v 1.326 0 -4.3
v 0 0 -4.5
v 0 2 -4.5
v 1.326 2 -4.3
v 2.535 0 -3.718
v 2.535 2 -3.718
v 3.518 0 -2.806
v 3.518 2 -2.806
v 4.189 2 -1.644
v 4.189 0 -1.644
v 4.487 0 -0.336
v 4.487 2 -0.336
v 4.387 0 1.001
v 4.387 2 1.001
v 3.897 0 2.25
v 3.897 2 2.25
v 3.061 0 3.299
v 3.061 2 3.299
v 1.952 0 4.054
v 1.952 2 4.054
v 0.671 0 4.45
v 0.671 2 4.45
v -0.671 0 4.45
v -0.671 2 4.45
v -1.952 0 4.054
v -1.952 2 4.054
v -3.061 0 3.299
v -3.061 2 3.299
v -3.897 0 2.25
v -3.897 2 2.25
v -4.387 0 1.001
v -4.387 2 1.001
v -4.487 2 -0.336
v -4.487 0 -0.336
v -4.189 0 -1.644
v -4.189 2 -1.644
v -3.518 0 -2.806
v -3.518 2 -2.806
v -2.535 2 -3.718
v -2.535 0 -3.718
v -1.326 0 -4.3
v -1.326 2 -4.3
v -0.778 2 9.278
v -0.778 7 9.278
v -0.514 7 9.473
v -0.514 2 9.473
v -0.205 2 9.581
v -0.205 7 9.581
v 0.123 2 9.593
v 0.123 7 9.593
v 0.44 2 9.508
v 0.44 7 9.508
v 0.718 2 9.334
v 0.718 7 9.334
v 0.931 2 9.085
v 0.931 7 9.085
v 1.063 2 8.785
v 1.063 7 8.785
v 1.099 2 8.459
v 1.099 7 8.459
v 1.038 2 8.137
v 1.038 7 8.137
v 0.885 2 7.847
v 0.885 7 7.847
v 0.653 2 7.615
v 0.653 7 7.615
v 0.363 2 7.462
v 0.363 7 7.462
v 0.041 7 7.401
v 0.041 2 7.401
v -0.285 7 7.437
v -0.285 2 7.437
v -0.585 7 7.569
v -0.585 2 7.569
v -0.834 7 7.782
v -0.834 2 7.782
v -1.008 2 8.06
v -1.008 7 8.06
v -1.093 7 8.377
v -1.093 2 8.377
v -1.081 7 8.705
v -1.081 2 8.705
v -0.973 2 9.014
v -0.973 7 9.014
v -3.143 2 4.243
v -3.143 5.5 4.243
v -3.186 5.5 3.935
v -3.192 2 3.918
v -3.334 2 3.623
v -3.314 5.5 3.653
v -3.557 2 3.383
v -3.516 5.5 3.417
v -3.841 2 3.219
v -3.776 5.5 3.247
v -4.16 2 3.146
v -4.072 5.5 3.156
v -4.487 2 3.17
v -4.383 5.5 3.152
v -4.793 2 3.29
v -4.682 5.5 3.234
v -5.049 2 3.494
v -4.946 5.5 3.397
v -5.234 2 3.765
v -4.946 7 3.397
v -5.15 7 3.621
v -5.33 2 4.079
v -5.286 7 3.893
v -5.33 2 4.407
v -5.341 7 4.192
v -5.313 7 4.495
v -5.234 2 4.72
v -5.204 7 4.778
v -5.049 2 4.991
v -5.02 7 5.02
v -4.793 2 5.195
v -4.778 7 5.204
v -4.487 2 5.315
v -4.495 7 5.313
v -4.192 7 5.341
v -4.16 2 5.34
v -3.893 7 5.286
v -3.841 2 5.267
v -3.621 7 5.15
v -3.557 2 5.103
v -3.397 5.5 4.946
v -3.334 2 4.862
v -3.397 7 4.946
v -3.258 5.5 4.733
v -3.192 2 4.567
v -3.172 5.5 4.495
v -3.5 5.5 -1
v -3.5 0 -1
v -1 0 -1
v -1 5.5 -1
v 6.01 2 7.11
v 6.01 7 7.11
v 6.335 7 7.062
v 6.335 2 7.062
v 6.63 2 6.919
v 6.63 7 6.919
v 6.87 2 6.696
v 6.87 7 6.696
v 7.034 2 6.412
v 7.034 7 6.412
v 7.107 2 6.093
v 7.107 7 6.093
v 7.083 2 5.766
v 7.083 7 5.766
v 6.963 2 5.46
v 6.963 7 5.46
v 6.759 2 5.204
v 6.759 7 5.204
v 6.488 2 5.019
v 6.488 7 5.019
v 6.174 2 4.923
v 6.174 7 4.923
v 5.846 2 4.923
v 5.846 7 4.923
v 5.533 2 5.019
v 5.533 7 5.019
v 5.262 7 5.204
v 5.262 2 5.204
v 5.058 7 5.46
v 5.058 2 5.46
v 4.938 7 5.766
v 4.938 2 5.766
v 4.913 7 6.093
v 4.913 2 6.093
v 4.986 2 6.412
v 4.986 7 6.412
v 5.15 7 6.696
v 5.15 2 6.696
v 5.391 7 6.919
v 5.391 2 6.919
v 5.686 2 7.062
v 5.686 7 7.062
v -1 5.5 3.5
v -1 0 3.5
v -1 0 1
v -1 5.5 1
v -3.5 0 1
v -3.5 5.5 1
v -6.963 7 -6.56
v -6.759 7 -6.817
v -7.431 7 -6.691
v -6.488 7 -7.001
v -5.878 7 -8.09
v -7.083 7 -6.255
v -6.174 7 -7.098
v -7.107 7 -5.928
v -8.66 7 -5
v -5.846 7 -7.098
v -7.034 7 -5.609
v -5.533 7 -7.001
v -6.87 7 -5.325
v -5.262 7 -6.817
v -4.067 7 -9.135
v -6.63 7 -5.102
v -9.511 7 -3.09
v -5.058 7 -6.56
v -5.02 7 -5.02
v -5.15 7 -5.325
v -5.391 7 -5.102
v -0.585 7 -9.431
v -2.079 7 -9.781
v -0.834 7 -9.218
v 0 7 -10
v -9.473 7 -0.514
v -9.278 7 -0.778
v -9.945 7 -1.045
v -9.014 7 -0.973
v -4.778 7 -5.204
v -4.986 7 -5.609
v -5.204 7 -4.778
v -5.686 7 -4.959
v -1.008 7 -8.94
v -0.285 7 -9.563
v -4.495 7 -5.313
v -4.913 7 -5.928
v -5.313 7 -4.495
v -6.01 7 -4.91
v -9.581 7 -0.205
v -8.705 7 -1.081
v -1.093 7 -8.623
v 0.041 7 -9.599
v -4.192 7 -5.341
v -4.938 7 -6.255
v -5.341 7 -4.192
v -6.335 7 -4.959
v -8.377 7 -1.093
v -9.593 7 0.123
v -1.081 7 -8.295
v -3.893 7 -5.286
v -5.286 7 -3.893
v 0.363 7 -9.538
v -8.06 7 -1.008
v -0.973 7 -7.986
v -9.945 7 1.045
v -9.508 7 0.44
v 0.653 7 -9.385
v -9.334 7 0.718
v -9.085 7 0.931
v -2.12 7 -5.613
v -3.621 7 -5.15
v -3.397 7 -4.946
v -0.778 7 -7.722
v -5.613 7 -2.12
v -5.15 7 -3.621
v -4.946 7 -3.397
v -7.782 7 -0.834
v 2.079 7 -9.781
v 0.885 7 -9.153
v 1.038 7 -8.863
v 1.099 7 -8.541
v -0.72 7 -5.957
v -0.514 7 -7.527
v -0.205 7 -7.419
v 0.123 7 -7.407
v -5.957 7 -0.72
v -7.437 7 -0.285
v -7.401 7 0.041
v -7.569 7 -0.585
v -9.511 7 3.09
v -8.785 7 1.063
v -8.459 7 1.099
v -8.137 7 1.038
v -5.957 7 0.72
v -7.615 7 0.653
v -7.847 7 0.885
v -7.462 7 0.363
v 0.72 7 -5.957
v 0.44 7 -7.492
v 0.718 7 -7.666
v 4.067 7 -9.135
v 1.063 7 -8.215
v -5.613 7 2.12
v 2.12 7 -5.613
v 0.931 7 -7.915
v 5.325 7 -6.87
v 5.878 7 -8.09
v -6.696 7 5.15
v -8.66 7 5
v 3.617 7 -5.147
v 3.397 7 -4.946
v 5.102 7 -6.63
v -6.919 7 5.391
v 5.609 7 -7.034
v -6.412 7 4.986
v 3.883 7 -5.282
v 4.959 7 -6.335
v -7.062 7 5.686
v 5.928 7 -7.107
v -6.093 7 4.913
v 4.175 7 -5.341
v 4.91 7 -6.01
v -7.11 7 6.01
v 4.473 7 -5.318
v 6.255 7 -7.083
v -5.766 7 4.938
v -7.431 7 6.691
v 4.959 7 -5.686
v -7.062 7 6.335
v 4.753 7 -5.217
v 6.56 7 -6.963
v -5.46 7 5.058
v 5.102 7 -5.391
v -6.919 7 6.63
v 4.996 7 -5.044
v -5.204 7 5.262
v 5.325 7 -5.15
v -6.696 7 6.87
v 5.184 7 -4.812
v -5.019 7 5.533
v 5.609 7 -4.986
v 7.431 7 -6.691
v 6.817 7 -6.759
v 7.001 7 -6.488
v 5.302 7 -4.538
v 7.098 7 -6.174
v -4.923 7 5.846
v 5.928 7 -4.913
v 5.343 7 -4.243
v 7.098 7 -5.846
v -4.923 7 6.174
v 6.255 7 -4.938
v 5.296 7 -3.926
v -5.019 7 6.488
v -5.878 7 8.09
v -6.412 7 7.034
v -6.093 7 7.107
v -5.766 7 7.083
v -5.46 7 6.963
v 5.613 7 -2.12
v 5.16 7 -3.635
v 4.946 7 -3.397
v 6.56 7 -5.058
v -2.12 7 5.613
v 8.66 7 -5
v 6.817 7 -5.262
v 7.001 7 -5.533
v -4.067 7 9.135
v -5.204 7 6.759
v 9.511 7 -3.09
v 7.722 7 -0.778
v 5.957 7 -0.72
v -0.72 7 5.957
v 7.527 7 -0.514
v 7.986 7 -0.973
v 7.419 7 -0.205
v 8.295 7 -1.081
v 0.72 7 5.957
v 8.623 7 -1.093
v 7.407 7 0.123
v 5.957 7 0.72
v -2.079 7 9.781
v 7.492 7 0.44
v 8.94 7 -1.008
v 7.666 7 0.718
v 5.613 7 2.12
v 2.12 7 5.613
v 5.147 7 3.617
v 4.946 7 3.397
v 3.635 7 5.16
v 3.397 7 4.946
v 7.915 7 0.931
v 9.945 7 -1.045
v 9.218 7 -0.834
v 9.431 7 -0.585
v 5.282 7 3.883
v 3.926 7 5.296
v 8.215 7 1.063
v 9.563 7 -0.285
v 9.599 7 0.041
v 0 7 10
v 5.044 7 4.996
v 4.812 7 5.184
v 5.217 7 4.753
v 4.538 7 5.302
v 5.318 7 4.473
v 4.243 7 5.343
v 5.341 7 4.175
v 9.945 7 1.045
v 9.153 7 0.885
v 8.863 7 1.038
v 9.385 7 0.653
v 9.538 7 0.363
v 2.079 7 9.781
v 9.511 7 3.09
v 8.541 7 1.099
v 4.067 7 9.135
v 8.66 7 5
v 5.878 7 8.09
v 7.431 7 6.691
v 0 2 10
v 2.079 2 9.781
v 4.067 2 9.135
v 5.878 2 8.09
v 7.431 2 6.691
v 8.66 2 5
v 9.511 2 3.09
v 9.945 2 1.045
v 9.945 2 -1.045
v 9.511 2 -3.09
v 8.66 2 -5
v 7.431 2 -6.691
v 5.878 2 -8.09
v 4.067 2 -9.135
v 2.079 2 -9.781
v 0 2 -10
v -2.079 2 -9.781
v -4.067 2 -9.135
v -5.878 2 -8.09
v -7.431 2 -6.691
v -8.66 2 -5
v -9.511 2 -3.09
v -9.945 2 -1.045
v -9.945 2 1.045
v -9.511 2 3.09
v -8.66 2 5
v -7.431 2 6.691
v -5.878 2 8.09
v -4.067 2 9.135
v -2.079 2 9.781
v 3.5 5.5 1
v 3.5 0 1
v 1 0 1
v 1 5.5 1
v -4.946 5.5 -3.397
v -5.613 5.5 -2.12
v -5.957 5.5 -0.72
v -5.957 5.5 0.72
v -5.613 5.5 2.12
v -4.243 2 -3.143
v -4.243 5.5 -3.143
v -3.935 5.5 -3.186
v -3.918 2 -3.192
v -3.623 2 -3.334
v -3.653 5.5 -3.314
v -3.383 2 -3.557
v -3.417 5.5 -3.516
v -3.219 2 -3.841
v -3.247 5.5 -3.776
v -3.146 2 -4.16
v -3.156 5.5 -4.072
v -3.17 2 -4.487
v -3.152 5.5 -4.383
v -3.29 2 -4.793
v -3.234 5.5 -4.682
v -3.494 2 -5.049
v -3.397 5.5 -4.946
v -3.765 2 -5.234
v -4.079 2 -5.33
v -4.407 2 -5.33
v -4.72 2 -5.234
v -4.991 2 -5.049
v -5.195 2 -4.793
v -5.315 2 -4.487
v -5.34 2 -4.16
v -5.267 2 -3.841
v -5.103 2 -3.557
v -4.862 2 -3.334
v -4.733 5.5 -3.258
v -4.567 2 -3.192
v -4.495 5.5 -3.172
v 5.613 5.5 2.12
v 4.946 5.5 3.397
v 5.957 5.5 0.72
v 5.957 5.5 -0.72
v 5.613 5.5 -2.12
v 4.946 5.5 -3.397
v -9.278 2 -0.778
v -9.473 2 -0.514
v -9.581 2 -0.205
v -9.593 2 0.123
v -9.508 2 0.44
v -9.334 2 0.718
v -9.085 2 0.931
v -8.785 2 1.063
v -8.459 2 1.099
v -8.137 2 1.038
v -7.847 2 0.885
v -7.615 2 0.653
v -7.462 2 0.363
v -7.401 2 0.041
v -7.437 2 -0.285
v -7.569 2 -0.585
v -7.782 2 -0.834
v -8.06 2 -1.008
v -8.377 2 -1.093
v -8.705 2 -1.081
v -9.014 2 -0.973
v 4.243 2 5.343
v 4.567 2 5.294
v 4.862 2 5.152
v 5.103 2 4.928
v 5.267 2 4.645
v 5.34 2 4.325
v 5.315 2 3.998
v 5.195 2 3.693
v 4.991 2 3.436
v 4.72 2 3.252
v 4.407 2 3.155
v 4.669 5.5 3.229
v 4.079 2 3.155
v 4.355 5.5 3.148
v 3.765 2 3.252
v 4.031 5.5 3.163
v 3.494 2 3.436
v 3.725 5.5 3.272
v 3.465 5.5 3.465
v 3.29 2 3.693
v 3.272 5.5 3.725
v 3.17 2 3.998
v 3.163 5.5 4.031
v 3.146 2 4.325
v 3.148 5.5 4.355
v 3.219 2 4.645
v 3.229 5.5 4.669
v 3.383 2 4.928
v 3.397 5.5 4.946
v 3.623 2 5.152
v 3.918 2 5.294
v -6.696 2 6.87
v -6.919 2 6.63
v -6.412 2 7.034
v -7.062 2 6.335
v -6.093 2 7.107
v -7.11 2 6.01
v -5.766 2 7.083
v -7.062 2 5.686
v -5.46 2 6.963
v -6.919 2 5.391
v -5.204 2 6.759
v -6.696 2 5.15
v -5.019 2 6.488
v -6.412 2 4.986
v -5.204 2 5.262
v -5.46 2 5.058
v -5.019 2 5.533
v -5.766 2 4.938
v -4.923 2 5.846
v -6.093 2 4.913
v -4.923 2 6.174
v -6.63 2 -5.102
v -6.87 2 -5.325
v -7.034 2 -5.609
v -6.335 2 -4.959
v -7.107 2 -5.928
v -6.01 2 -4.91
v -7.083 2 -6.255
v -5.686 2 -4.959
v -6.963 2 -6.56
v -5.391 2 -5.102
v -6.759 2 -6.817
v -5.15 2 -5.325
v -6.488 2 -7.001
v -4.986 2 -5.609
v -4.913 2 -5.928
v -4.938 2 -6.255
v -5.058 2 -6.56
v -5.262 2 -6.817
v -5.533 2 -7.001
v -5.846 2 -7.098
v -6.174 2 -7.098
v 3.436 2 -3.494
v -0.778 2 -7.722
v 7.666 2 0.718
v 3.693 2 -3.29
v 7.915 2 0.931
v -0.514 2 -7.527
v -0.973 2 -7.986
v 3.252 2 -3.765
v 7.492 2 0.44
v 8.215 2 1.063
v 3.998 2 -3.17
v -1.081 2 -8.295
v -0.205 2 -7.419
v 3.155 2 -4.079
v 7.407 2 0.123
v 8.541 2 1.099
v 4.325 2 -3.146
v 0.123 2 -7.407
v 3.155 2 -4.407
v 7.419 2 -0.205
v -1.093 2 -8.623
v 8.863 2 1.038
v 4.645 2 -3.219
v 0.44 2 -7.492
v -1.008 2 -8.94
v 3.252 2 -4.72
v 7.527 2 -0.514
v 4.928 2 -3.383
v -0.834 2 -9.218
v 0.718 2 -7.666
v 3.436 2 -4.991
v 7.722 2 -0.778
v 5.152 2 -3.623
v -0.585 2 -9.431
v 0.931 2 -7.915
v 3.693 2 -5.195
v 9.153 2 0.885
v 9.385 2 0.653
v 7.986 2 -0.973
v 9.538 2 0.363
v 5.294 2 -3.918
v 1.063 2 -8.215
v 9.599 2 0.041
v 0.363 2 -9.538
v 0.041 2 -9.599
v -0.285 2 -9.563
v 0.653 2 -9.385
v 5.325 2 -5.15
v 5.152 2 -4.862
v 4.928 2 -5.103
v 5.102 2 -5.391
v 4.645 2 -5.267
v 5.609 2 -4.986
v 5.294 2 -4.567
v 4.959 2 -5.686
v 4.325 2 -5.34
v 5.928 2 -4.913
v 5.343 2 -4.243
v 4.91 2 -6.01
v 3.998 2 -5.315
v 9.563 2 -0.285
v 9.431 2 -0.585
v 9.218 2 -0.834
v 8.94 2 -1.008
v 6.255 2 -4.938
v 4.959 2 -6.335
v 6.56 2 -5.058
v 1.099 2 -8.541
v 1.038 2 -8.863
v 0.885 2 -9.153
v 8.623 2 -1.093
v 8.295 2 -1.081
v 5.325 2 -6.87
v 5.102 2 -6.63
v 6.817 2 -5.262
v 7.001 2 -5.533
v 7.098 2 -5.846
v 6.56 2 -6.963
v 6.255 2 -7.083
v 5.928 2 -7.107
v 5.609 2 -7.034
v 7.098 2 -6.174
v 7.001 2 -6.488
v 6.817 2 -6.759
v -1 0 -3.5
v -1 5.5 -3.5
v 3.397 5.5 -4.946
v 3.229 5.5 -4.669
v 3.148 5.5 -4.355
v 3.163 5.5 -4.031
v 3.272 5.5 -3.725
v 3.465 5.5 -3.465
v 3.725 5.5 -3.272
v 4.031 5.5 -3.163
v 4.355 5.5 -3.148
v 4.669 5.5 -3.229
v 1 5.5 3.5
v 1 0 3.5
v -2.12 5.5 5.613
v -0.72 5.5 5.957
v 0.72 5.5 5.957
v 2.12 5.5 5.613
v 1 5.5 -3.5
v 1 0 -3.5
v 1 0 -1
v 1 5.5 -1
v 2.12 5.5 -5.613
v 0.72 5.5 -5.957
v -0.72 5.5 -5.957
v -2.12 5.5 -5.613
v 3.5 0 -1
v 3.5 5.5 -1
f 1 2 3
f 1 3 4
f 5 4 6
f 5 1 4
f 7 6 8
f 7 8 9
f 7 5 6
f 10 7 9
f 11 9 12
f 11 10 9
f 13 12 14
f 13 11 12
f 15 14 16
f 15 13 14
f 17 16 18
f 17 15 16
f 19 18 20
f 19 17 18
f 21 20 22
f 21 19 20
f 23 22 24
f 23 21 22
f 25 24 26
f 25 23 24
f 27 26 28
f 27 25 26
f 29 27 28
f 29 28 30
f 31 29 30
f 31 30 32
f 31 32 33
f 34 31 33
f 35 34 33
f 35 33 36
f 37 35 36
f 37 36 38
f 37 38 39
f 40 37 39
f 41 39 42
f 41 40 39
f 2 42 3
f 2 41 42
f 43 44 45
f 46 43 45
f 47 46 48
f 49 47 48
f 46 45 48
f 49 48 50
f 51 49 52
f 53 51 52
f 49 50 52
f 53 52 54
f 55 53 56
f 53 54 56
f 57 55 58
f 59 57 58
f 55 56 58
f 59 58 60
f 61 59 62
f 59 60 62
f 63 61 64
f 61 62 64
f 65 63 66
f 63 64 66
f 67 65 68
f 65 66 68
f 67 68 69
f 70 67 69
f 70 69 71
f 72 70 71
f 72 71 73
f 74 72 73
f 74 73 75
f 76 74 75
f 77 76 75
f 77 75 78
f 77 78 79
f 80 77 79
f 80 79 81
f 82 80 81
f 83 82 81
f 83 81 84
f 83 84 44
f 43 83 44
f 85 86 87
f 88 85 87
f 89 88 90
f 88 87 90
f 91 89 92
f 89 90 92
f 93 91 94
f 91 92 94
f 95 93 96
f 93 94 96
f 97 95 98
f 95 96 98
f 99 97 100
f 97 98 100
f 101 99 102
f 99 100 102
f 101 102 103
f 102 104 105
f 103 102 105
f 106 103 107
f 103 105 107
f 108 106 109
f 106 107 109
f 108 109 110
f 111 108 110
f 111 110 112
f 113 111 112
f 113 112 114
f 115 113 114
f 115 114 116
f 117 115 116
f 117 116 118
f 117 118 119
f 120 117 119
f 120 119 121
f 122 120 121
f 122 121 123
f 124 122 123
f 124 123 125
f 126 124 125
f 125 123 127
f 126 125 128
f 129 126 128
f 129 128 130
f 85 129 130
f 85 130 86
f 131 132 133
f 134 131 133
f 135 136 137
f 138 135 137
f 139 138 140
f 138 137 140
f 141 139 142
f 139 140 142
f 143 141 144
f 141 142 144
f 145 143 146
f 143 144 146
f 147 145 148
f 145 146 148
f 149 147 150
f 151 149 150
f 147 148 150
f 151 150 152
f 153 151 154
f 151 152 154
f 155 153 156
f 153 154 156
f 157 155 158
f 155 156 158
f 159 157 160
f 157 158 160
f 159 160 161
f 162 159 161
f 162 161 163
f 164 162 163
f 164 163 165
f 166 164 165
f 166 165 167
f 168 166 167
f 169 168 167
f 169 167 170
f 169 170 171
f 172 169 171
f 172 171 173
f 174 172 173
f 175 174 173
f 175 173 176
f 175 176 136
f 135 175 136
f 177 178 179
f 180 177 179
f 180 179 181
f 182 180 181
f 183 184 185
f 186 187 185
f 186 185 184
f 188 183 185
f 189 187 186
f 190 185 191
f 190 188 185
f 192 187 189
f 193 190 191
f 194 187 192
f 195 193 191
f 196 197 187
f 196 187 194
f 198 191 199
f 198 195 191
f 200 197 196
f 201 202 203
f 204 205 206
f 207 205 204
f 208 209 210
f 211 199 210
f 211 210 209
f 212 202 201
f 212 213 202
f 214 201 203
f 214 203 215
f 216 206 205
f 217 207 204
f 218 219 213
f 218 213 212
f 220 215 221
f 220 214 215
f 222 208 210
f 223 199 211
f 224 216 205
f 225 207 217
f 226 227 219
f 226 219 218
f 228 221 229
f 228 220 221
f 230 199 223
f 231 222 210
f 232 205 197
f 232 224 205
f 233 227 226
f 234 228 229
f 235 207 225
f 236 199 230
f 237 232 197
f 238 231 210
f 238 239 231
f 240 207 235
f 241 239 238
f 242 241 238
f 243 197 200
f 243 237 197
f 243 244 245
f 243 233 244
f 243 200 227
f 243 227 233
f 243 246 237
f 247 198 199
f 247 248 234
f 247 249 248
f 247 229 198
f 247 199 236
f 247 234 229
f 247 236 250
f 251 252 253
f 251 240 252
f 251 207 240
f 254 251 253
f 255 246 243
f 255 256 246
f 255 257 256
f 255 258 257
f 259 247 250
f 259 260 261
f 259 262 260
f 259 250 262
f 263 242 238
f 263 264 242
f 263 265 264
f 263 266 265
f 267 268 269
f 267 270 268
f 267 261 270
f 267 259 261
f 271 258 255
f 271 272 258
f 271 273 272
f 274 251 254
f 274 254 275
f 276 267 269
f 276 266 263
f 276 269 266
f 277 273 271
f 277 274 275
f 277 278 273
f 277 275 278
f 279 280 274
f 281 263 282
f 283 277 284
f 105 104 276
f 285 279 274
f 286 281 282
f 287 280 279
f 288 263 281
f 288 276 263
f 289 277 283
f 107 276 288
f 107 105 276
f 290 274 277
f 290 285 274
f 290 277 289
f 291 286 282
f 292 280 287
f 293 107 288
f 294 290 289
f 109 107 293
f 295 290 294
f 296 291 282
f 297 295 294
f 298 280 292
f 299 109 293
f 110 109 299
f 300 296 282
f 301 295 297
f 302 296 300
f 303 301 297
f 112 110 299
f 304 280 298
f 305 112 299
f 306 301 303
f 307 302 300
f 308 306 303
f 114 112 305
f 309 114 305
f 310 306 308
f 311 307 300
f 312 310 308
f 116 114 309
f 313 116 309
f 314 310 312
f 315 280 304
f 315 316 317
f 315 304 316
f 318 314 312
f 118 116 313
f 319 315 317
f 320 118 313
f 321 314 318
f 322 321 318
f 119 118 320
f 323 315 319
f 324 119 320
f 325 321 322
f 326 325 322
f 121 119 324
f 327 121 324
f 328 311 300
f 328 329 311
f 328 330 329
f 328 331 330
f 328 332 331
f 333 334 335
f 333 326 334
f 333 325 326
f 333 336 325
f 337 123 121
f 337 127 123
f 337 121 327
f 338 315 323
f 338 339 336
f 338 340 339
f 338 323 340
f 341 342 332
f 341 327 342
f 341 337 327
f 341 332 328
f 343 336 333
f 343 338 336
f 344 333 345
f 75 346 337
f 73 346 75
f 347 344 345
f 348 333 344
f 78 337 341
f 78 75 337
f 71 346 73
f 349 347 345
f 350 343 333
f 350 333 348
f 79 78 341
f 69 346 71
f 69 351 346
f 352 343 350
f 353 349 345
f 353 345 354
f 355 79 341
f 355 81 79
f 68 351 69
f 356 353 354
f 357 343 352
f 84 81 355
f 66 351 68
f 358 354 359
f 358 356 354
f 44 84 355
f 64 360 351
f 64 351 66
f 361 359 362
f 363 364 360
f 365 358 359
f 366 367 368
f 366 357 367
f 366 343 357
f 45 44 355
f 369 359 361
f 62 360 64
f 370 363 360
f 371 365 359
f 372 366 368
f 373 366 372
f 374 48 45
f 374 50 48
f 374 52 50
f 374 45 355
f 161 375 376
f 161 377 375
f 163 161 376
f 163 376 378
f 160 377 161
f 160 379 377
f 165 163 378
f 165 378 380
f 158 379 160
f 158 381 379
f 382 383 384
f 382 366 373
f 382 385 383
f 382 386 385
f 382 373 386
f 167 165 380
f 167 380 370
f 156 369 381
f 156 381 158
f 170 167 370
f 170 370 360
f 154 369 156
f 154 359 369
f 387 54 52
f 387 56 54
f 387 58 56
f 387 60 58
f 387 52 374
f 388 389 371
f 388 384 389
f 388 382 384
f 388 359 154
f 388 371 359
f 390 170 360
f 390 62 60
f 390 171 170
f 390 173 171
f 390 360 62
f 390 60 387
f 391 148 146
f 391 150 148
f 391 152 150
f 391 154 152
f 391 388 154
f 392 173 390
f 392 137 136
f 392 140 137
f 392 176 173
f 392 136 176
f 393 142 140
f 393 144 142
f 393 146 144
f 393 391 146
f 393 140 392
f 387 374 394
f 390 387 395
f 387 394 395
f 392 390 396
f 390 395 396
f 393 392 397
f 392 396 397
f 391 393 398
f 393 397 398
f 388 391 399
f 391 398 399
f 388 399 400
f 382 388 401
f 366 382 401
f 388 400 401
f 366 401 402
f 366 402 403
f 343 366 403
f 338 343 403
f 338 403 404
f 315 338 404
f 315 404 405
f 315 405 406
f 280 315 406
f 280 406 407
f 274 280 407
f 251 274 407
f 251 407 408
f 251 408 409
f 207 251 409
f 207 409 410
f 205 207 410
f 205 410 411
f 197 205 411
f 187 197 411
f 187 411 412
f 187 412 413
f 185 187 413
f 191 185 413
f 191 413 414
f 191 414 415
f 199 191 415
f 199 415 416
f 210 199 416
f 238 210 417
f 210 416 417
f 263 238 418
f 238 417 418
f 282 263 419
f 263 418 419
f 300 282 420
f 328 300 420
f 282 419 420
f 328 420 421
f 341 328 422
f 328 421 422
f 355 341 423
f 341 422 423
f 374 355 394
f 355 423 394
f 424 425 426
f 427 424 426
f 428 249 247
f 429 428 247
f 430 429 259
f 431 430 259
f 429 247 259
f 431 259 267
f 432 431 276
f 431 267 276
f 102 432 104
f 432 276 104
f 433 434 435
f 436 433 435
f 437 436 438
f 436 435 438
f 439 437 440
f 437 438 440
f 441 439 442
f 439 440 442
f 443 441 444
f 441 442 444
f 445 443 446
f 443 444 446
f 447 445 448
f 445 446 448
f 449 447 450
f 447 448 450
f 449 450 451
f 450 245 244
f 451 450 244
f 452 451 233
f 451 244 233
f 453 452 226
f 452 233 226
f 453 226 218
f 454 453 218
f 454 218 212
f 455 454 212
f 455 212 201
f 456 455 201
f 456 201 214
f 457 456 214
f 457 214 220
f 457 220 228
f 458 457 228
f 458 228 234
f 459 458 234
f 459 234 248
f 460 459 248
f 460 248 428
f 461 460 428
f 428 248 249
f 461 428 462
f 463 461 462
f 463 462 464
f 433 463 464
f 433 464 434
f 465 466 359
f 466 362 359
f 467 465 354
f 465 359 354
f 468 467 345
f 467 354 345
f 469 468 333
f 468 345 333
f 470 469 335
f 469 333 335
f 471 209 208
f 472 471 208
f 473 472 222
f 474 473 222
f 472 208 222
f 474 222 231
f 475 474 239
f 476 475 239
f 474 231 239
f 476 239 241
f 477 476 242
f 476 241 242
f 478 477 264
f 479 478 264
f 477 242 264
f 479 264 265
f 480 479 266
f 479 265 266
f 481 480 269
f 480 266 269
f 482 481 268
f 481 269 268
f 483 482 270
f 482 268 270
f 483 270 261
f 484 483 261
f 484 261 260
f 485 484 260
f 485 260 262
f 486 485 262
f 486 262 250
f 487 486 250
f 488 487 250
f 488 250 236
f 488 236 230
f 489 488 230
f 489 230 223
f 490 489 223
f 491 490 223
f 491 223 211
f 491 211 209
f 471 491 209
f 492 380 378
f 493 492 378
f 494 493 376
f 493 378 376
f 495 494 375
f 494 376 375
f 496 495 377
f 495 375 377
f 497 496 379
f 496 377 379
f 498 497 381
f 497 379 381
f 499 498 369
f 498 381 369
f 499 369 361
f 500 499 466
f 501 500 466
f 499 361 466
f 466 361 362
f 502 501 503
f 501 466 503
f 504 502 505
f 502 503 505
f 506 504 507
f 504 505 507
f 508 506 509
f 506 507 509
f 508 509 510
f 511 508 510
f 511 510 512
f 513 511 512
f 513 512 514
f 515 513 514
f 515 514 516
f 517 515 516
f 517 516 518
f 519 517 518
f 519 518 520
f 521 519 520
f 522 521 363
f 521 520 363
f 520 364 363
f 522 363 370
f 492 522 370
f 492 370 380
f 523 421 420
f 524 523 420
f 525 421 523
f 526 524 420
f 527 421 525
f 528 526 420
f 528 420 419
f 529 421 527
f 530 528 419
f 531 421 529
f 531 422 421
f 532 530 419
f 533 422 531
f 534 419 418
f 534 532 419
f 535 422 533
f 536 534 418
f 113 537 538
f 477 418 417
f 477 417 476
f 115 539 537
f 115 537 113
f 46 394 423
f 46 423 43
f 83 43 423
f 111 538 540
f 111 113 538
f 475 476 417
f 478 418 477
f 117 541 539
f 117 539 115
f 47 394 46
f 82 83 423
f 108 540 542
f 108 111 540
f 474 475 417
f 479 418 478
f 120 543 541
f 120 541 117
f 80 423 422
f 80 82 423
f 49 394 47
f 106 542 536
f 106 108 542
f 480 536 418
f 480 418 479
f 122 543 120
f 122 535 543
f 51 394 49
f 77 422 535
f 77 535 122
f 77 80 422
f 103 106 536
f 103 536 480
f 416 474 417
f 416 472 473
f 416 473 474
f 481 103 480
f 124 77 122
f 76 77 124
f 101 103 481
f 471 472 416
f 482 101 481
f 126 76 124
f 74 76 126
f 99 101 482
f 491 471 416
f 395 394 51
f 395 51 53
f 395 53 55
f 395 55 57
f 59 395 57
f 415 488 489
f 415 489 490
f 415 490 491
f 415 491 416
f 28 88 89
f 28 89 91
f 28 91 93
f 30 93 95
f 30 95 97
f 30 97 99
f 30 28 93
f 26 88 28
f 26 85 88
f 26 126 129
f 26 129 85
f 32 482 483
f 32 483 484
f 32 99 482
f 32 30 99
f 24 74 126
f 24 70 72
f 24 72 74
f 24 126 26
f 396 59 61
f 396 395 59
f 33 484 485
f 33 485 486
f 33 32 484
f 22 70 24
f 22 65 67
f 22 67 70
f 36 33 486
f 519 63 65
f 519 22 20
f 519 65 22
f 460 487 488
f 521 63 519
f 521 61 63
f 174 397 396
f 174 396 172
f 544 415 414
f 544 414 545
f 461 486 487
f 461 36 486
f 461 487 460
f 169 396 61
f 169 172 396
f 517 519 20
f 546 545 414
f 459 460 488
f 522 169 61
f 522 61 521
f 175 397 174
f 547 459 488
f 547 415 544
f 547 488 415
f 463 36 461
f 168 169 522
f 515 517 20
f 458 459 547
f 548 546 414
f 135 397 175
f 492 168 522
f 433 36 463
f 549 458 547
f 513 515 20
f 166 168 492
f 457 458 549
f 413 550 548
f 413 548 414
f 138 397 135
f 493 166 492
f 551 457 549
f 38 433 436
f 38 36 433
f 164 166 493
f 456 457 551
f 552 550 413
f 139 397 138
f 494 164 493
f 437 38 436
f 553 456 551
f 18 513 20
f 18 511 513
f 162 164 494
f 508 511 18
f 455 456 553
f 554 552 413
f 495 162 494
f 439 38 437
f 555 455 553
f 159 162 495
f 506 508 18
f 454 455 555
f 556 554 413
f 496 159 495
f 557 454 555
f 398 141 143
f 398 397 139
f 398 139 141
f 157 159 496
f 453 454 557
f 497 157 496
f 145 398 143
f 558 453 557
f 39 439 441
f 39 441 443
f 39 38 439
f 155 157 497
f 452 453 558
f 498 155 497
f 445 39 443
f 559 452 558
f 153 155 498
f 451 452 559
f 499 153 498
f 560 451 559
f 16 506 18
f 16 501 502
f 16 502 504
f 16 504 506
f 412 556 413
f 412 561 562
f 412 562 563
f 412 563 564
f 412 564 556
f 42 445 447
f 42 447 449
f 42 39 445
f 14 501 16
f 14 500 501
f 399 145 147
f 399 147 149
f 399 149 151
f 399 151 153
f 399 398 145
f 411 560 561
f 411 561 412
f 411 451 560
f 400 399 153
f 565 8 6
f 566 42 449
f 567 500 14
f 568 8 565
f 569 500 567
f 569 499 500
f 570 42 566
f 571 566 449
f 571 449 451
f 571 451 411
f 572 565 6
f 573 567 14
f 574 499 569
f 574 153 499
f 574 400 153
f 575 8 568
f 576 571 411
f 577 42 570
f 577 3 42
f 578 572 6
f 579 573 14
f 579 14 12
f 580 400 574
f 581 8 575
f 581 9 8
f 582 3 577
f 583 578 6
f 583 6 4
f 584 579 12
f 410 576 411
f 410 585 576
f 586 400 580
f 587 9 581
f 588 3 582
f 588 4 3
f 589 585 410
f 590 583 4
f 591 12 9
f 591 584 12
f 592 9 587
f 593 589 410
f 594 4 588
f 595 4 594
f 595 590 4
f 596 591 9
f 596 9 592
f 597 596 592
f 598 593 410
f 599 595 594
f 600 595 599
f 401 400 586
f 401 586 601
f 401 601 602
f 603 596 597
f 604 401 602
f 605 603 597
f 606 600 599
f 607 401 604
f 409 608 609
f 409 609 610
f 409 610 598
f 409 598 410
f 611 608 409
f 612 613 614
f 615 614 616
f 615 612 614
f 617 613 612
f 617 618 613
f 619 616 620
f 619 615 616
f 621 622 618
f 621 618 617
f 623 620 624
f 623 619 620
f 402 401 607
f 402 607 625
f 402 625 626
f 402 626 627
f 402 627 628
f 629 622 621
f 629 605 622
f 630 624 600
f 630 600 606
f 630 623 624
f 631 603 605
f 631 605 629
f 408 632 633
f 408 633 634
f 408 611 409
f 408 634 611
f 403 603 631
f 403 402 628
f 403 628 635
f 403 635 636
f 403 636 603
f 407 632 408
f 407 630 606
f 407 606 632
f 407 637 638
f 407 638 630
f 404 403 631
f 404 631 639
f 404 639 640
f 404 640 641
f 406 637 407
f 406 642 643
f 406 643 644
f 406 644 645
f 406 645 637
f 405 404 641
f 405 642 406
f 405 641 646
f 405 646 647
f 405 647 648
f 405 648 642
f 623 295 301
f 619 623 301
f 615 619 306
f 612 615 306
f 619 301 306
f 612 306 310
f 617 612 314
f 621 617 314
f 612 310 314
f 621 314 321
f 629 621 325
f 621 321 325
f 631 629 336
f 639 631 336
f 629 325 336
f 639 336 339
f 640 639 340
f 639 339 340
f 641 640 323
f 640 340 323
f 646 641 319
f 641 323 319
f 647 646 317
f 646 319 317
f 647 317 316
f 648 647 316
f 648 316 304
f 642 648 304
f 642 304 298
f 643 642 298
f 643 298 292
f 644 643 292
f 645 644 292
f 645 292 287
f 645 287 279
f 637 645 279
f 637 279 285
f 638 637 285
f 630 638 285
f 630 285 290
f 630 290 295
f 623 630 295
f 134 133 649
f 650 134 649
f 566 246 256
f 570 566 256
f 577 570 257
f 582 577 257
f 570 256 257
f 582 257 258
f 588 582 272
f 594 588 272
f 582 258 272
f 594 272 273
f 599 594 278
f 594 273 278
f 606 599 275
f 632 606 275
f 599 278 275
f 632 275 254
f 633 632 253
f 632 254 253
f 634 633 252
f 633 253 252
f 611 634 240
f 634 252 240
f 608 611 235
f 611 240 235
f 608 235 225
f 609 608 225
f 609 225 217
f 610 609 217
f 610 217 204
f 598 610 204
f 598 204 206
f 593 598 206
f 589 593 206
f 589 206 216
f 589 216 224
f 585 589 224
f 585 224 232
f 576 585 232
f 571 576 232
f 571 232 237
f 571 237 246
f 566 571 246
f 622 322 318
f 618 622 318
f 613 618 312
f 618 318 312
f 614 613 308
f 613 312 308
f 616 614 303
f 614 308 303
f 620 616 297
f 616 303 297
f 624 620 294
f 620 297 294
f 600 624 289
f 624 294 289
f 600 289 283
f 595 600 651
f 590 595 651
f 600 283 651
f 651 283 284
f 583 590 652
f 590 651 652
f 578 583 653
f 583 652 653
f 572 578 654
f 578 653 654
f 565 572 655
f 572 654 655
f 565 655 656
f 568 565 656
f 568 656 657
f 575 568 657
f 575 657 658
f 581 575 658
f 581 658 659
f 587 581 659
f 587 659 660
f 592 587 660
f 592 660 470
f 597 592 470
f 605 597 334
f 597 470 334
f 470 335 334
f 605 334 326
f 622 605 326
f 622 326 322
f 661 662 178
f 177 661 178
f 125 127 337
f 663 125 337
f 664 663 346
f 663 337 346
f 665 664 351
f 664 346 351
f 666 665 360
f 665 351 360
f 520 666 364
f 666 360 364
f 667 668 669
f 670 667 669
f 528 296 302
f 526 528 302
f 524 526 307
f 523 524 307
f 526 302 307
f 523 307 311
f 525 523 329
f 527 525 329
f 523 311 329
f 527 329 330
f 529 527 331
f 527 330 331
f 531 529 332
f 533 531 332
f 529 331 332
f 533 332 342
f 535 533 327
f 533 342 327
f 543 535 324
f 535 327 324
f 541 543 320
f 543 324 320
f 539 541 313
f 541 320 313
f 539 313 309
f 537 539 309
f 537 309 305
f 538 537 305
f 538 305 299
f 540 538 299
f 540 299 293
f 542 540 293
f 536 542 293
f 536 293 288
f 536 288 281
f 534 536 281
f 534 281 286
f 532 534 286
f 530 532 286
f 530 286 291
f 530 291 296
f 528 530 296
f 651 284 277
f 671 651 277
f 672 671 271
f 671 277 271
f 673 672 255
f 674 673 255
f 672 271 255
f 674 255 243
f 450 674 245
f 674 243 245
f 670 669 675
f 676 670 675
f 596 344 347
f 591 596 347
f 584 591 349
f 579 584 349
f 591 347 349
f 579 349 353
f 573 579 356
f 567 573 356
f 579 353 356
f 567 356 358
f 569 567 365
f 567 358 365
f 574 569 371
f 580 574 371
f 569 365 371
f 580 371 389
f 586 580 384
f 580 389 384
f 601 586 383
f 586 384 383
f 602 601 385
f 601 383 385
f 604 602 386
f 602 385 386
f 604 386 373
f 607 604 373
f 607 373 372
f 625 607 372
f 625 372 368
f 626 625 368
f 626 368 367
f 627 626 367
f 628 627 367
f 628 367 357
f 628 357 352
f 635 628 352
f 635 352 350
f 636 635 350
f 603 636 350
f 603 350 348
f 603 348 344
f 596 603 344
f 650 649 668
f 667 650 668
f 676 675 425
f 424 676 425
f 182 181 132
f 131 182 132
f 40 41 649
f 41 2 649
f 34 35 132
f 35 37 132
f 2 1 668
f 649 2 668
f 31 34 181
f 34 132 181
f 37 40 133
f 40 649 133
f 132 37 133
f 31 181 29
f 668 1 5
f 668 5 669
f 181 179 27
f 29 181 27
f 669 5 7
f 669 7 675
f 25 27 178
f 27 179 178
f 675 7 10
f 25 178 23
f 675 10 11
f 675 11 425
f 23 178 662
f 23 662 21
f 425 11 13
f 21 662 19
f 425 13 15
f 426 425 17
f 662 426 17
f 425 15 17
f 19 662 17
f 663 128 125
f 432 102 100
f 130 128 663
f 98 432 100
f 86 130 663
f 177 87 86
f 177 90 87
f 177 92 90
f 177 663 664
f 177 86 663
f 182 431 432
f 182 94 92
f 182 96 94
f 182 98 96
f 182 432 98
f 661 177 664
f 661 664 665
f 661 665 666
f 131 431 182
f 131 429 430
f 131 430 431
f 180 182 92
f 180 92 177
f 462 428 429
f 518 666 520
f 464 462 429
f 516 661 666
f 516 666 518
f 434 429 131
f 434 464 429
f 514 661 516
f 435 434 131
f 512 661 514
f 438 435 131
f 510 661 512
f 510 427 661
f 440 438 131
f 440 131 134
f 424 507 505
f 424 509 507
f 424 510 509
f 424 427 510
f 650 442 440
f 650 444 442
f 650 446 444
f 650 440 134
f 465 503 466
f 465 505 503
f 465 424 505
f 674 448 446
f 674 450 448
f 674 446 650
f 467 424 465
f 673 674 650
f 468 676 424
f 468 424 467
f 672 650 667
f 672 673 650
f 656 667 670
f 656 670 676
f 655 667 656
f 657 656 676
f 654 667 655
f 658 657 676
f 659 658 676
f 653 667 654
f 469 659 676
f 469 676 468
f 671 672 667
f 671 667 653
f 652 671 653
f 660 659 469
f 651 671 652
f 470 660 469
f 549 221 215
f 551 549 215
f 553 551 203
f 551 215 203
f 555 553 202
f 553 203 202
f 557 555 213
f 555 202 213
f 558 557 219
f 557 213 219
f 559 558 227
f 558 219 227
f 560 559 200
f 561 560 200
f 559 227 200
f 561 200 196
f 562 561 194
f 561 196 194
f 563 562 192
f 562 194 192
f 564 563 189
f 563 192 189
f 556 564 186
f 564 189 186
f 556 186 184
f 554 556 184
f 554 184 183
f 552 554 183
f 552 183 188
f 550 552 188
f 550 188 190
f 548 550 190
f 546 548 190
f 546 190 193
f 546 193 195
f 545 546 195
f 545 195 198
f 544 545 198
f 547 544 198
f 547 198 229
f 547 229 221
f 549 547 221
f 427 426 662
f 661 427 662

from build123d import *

# Parameters (mm, degrees)
SKETCH_1_R               = 10
EXTRUDE_1_DEPTH          = 7
SKETCH_2_R               = 1.1
CUT_EXTRUDE_1_DEPTH      = 16.779733838
PATTERN_CIRCULAR_1_COUNT = 4
PATTERN_CIRCULAR_1_ANGLE = 135
SKETCH_3_R               = 1.1
CUT_EXTRUDE_2_DEPTH      = 16.779733838
PATTERN_CIRCULAR_2_COUNT = 2
PATTERN_CIRCULAR_2_ANGLE = 90
SKETCH_4_R               = 6
CUT_EXTRUDE_3_DEPTH      = 1.5
SKETCH_5_R               = 10
SKETCH_5_R_2             = 4.5
CUT_EXTRUDE_4_DEPTH      = 2


with BuildPart() as part:
    # 草图1 → 凸台-拉伸1 (new body)
    with BuildSketch(Plane(origin=(0, 0, 0), x_dir=(1, 0, 0), z_dir=(0, 1, 0))):
        with Locations(Location((0, 0, 0), (0, 0, 270))):
            Circle(SKETCH_1_R)
        Polygon((1, 1), (3.5, 1), (3.5, -1), (1, -1), (1, -3.5), (-1, -3.5), (-1, -1), (-3.5, -1), (-3.5, 1), (-1, 1), (-1, 3.5), (1, 3.5), align=None, mode=Mode.SUBTRACT)
    extrude(amount=EXTRUDE_1_DEPTH)

    # 草图2 → 切除-拉伸1 (cut, through all)
    with BuildSketch(Plane(origin=(0, 7, 0), x_dir=(1, 0, 0), z_dir=(0, 1, 0))):
        with Locations(Location((-6.01040764, 6.01040764, 0), (0, 0, 270))):
            Circle(SKETCH_2_R)
        with Locations(Location((6.01040764, -6.01040764, 0), (0, 0, 270))):
            Circle(SKETCH_2_R)
    cut_extrude_1 = extrude(amount=-CUT_EXTRUDE_1_DEPTH, mode=Mode.SUBTRACT)

    # 阵列(圆周)1: 切除-拉伸1 ×4 about axis
    pattern_circular_1_axis = Axis((0, 0, 0), (0, -1, 0))
    for i in range(1, PATTERN_CIRCULAR_1_COUNT):
        add(cut_extrude_1.rotate(pattern_circular_1_axis, i * PATTERN_CIRCULAR_1_ANGLE / (PATTERN_CIRCULAR_1_COUNT - 1)), mode=Mode.SUBTRACT)

    # 草图3 → 切除-拉伸2 (cut, through all)
    with BuildSketch(Plane(origin=(0, 7, 0), x_dir=(1, 0, 0), z_dir=(0, 1, 0))):
        with Locations(Location((-4.242640687, 4.242640687, 0), (0, 0, 270))):
            Circle(SKETCH_3_R)
        with Locations(Location((4.242640687, -4.242640687, 0), (0, 0, 270))):
            Circle(SKETCH_3_R)
    cut_extrude_2 = extrude(amount=-CUT_EXTRUDE_2_DEPTH, mode=Mode.SUBTRACT)

    # 阵列(圆周)2: 切除-拉伸2 ×2 about axis
    pattern_circular_2_axis = Axis((0, 0, 0), (0, 1, 0))
    for i in range(1, PATTERN_CIRCULAR_2_COUNT):
        add(cut_extrude_2.rotate(pattern_circular_2_axis, i * PATTERN_CIRCULAR_2_ANGLE / (PATTERN_CIRCULAR_2_COUNT - 1)), mode=Mode.SUBTRACT)

    # 草图4 → 切除-拉伸3 (cut)
    with BuildSketch(Plane(origin=(0, 7, 0), x_dir=(1, 0, 0), z_dir=(0, 1, 0))):
        Circle(SKETCH_4_R)
    extrude(amount=-CUT_EXTRUDE_3_DEPTH, mode=Mode.SUBTRACT)

    # 草图5 → 切除-拉伸4 (cut)
    with BuildSketch(Plane.XZ):
        with Locations(Location((0, 0, 0), (0, 0, 270))):
            Circle(SKETCH_5_R)
        with Locations(Location((0, 0, 0), (0, 0, 270))):
            Circle(SKETCH_5_R_2, mode=Mode.SUBTRACT)
    extrude(amount=-CUT_EXTRUDE_4_DEPTH, mode=Mode.SUBTRACT)


solid = part.part
